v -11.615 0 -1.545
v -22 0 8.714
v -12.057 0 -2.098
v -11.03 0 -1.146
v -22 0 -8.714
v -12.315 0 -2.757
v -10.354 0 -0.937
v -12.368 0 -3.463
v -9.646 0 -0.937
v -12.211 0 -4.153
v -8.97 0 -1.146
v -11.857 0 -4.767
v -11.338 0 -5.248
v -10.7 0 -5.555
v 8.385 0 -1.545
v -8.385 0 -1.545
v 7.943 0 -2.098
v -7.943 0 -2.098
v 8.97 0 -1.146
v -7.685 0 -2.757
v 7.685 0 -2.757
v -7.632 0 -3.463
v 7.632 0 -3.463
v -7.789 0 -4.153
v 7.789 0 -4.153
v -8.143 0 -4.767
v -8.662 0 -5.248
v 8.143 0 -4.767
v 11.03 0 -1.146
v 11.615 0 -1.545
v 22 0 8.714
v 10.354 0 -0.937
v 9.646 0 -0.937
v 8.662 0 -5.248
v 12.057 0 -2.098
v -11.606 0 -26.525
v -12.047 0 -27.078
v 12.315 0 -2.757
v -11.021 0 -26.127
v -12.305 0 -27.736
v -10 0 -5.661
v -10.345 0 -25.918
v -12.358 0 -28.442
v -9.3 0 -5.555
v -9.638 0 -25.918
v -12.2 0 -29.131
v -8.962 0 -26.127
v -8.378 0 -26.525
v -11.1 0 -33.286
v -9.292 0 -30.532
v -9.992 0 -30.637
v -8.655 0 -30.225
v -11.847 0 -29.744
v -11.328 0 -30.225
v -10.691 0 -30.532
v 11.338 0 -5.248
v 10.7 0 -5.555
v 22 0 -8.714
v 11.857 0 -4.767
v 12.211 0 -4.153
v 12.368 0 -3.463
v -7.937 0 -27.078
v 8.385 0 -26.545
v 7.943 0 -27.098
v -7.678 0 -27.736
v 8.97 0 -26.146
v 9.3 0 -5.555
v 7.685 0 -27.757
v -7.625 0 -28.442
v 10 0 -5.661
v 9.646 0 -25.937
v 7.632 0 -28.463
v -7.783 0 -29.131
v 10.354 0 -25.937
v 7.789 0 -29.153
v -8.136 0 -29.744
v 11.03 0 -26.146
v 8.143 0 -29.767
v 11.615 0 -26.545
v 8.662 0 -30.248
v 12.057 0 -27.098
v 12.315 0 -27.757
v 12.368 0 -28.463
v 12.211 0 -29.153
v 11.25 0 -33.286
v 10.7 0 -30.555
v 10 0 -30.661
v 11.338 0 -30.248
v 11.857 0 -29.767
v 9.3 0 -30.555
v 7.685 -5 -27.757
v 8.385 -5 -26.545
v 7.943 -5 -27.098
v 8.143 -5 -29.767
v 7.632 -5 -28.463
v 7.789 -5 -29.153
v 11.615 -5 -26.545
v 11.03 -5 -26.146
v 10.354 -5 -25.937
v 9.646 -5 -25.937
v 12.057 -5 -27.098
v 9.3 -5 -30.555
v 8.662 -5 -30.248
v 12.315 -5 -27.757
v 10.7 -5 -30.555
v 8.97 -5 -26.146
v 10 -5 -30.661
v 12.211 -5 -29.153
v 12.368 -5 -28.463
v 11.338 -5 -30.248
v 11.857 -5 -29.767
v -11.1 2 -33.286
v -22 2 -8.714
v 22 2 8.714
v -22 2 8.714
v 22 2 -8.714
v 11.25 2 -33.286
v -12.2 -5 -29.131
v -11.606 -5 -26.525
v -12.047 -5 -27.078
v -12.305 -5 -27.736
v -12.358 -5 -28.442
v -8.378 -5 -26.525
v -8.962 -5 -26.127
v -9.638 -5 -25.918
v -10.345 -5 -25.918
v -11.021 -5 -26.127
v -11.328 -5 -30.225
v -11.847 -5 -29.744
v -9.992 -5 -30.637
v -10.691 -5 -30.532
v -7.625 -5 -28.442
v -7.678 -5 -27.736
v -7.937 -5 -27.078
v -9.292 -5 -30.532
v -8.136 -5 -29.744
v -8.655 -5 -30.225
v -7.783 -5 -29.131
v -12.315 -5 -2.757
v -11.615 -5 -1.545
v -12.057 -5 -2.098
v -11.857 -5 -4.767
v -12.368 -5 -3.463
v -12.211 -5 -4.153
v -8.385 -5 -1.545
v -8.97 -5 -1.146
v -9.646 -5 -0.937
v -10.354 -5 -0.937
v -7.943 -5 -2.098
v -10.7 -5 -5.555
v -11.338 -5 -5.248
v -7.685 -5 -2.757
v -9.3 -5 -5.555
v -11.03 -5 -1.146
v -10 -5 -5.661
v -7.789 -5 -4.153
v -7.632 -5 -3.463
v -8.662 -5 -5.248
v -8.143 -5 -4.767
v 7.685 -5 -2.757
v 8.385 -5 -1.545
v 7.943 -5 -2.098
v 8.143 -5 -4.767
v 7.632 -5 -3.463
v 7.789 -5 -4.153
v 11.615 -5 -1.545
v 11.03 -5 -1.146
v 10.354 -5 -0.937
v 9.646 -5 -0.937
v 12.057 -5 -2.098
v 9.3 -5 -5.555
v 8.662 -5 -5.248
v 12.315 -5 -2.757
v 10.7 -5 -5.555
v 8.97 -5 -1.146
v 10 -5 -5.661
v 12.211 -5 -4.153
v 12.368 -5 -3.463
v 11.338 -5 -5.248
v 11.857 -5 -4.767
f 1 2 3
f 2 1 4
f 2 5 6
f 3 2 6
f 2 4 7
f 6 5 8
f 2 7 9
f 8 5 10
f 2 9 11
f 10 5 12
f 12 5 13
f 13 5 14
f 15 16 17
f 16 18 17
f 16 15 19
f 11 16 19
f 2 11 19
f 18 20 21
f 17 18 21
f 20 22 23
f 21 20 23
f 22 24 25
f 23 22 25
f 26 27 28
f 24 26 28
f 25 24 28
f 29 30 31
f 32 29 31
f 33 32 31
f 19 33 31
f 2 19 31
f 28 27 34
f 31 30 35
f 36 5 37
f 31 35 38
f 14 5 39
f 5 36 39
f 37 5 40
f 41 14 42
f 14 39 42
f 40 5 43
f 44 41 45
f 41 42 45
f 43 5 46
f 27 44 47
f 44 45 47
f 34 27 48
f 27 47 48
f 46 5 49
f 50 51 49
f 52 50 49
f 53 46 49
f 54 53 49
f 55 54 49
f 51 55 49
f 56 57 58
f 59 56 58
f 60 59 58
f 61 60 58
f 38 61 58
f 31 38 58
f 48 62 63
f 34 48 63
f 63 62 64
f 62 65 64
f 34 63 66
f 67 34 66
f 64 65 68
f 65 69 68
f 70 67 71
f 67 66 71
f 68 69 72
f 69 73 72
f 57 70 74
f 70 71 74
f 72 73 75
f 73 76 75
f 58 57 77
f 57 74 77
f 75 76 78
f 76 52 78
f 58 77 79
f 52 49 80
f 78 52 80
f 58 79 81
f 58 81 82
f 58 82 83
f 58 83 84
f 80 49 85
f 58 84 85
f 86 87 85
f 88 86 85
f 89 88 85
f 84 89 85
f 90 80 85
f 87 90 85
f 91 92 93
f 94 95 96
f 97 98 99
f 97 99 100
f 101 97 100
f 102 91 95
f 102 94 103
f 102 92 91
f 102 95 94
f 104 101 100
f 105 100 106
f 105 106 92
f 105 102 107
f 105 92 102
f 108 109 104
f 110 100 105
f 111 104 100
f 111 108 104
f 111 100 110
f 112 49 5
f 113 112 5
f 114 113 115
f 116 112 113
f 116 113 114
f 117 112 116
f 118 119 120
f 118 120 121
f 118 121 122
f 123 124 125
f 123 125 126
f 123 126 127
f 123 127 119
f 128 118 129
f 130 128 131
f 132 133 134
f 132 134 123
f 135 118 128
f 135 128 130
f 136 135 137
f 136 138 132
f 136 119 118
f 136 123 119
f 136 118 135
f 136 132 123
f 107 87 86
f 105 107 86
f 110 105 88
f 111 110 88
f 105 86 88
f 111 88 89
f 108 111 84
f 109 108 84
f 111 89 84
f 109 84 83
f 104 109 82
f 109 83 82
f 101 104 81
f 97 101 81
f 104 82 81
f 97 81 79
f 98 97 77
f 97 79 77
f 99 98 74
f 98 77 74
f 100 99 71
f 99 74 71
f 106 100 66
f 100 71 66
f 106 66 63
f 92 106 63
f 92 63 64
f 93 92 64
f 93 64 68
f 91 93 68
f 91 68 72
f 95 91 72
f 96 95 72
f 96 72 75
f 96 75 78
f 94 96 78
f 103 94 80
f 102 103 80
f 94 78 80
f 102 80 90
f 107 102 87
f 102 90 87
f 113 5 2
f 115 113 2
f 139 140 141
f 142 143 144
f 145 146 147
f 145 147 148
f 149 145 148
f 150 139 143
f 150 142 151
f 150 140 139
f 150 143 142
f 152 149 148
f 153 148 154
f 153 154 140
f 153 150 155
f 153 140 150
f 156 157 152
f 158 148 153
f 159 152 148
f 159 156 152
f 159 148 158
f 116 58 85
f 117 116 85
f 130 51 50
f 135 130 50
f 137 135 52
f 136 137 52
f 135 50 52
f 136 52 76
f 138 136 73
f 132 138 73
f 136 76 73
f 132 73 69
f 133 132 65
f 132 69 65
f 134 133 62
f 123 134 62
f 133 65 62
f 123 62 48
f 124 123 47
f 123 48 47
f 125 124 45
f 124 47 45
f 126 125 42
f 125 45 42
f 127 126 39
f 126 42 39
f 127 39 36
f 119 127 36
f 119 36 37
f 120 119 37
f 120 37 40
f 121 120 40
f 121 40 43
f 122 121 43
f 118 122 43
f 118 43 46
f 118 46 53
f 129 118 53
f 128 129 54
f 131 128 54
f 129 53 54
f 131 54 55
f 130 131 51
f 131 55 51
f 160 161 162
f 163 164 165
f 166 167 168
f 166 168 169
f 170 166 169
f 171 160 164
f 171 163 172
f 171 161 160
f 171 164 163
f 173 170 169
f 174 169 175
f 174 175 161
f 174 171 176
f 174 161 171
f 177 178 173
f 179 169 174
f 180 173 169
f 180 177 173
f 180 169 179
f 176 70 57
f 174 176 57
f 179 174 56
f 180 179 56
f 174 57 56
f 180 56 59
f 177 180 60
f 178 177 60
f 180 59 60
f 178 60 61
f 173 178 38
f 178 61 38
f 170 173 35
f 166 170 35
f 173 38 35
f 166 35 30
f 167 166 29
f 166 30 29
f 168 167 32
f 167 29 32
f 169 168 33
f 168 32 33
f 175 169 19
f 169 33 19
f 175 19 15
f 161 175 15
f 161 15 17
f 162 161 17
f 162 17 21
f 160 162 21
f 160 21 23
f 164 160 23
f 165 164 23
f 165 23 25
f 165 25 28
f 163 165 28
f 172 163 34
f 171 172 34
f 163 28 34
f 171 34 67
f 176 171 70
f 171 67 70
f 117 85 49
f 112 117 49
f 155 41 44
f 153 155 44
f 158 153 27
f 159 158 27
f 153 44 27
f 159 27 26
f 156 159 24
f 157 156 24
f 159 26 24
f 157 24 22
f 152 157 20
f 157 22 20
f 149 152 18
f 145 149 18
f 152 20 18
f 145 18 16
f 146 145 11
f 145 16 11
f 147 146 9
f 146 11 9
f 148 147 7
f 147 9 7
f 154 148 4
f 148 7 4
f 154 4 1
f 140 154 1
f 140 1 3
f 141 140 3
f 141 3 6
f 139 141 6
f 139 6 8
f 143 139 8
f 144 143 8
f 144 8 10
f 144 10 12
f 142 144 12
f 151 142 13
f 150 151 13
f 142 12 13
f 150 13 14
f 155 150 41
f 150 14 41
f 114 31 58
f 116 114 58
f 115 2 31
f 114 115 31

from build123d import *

# Parameters (mm, degrees)
BOSS_EXTRUDE1_DEPTH = 2
SKETCH3_R           = 2.375
SKETCH3_R_2         = 2.372845421
BOSS_EXTRUDE3_DEPTH = 5


with BuildPart() as part:
    # Sketch1 → Boss-Extrude1 (new body)
    with BuildSketch(Plane(origin=(0, 0, 0), x_dir=(1, 0, 0), z_dir=(0, 1, 0))):
        Polygon((-22, 8.714285714), (-22, -8.714285714), (22, -8.714285714), (22, 8.714285714), (11.25, 33.285714286), (-11.1, 33.285714286), align=None)
    extrude(amount=BOSS_EXTRUDE1_DEPTH)

    # Sketch3 → Boss-Extrude3 (add)
    with BuildSketch(Plane.XZ):
        with Locations(Location((-10, -3.285714286, 0), (0, 0, 270))):
            Circle(SKETCH3_R)
        with Locations(Location((-9.991570168, -28.264481029, 0), (0, 0, 270))):
            Circle(SKETCH3_R_2)
        with Locations(Location((10, -28.285714286, 0), (0, 0, 270))):
            Circle(SKETCH3_R)
        with Locations(Location((10, -3.285714286, 0), (0, 0, 270))):
            Circle(SKETCH3_R)
    extrude(amount=BOSS_EXTRUDE3_DEPTH)


solid = part.part
